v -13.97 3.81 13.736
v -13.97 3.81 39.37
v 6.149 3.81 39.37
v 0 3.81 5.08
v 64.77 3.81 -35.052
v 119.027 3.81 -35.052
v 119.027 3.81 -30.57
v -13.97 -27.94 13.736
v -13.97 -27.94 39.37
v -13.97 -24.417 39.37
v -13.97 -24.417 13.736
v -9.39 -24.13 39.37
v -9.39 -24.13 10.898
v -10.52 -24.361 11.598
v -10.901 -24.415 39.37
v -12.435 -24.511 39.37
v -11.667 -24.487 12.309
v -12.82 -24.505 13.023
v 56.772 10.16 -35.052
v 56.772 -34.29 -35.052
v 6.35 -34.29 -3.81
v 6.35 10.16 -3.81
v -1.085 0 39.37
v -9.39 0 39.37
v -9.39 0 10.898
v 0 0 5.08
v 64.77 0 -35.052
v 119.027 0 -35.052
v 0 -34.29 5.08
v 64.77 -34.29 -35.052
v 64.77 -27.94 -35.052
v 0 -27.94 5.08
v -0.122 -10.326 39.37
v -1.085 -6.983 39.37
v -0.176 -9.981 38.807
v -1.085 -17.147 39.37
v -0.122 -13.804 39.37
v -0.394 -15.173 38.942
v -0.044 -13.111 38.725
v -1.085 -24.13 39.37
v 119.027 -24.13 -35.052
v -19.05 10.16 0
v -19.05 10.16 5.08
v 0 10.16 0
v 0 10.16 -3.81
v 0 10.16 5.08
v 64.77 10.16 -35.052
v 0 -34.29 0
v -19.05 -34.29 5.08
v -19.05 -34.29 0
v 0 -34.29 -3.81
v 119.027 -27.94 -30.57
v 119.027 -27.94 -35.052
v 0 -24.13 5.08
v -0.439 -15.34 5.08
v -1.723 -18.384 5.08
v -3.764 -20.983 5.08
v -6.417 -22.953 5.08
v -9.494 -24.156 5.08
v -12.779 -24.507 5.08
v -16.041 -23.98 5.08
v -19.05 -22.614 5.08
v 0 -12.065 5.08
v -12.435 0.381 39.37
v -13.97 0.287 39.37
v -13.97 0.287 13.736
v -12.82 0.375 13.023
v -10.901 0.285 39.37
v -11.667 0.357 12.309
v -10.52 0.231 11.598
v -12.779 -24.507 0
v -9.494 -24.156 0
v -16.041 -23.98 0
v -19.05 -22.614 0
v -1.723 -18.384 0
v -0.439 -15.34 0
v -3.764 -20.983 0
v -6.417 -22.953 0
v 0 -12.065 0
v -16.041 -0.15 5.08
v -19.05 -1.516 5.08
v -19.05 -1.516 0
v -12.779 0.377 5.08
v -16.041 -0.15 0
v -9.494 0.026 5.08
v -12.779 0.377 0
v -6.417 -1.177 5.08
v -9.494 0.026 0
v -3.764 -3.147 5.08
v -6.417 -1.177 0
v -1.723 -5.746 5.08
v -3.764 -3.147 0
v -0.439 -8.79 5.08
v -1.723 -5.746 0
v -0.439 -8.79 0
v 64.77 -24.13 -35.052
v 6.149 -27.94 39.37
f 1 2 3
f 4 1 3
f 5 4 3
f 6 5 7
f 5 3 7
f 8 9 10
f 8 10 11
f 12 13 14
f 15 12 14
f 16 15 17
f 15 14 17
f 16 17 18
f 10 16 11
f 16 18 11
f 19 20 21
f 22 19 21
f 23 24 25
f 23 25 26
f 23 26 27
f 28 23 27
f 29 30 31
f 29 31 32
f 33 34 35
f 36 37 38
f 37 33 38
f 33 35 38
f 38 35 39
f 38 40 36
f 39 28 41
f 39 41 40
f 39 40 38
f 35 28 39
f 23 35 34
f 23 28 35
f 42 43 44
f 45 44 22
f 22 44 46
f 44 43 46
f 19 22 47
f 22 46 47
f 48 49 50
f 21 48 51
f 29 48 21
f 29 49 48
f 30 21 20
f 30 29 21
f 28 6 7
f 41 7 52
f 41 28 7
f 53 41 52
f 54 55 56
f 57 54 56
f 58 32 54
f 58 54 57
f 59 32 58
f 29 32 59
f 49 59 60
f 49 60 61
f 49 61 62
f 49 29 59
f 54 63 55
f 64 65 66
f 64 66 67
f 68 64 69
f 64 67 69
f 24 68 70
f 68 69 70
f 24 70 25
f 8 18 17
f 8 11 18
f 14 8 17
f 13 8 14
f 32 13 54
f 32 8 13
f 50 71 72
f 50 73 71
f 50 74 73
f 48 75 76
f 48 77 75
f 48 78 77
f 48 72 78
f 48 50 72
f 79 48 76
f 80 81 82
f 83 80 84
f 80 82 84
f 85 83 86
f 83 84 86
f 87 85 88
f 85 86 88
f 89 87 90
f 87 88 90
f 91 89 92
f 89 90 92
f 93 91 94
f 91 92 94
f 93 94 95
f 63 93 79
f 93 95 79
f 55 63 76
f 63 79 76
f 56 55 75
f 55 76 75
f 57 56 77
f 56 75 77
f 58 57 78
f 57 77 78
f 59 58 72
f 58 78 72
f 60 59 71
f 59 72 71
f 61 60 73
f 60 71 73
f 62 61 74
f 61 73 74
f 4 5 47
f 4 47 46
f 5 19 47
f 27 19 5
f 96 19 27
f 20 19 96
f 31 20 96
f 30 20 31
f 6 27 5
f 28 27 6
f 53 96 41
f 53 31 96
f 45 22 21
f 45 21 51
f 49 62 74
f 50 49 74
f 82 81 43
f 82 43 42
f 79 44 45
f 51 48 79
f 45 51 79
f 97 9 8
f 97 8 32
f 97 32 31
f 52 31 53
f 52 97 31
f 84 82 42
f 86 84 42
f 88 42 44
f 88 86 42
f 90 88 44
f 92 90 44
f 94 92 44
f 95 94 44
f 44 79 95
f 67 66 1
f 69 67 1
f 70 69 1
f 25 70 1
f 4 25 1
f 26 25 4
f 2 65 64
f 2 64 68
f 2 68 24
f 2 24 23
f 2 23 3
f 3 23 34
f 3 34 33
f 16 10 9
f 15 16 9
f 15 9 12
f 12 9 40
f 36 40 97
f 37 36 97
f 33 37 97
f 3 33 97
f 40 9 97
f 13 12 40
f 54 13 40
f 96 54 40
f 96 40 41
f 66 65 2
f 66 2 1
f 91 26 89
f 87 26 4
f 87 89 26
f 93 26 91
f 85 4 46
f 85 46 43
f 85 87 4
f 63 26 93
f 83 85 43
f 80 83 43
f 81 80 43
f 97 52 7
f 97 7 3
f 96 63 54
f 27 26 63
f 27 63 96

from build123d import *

# Parameters (mm, degrees)
F1_DEPTH      = 34.29
F1_DEPTH_BACK = 10.16
F3_DEPTH      = 27.94
F3_DEPTH_BACK = 3.81
F4_R          = 12.446
F5_DEPTH      = 39.37
F6_W          = 52.9463477433
F6_H          = 63.3781589568
F7_DEPTH      = 25.4
F9_DEPTH      = 24.13
F11_DEPTH     = 50.8
F12_W         = 7.2337351131
F12_H         = 31.75
F13_DEPTH     = 25.4


with BuildPart() as f1:
    # F0 (on Front) → F1 (new body, two sides)
    with BuildSketch(Plane.XZ) as f1_sk:
        Polygon((-19.05, 5.08), (-19.05, 0), (0, 0), (0, -35.052), (64.77, -35.052), (0, 5.08), align=None)
    extrude(amount=F1_DEPTH)
    extrude(f1_sk.sketch, amount=-F1_DEPTH_BACK)

    # F2 (on Front) → F3 (join, two sides)
    with BuildSketch(Plane.XZ) as f3_sk:
        Polygon((-13.97, 51.8359215686), (-13.97, 13.7359215686), (64.77, -35.052), (126.2605063291, -35.052), align=None)
    extrude(amount=F3_DEPTH)
    extrude(f3_sk.sketch, amount=-F3_DEPTH_BACK)

    # F4 (on face) → F5 (cut)
    with BuildSketch(Plane(origin=(0, 0, 0), x_dir=(1, 0, 0), z_dir=(0, 0, -1))):
        with Locations((-12.446, 12.065)):
            Circle(F4_R)
    extrude(amount=-F5_DEPTH, mode=Mode.SUBTRACT)

    # F6 (on face) → F7 (cut)
    with BuildSketch(Plane(origin=(0, 0, 39.37), x_dir=(1, 0, 0), z_dir=(0, 0, -1))):
        with Locations((-10.5953570455, 10.2349836379)):
            Rectangle(F6_W, F6_H)
    extrude(amount=-F7_DEPTH, mode=Mode.SUBTRACT)

    # F8 (on Front) → F9 (cut)
    with BuildSketch(Plane.XZ):
        Polygon((154.4132999091, -56.9777707196), (-10.16, 44.993136675), (-10.16, 11.3752156863), (100.156528693, -56.9777707196), align=None)
    extrude(amount=F9_DEPTH, mode=Mode.SUBTRACT)

    # F10 (on face) → F11 (cut)
    with BuildSketch(Plane.XZ.offset(34.29)):
        Polygon((0, -3.81), (0, -35.052), (56.7722151899, -35.052), (6.35, -3.81), align=None)
    extrude(amount=-F11_DEPTH, mode=Mode.SUBTRACT)

    # F12 (on face) → F13 (cut)
    with BuildSketch(Plane(origin=(0, 0, -35.052), x_dir=(1, 0, 0), z_dir=(0, 0, -1))):
        with Locations((122.6436387726, 12.065)):
            Rectangle(F12_W, F12_H)
    extrude(amount=-F13_DEPTH, mode=Mode.SUBTRACT)


solid = f1.part
